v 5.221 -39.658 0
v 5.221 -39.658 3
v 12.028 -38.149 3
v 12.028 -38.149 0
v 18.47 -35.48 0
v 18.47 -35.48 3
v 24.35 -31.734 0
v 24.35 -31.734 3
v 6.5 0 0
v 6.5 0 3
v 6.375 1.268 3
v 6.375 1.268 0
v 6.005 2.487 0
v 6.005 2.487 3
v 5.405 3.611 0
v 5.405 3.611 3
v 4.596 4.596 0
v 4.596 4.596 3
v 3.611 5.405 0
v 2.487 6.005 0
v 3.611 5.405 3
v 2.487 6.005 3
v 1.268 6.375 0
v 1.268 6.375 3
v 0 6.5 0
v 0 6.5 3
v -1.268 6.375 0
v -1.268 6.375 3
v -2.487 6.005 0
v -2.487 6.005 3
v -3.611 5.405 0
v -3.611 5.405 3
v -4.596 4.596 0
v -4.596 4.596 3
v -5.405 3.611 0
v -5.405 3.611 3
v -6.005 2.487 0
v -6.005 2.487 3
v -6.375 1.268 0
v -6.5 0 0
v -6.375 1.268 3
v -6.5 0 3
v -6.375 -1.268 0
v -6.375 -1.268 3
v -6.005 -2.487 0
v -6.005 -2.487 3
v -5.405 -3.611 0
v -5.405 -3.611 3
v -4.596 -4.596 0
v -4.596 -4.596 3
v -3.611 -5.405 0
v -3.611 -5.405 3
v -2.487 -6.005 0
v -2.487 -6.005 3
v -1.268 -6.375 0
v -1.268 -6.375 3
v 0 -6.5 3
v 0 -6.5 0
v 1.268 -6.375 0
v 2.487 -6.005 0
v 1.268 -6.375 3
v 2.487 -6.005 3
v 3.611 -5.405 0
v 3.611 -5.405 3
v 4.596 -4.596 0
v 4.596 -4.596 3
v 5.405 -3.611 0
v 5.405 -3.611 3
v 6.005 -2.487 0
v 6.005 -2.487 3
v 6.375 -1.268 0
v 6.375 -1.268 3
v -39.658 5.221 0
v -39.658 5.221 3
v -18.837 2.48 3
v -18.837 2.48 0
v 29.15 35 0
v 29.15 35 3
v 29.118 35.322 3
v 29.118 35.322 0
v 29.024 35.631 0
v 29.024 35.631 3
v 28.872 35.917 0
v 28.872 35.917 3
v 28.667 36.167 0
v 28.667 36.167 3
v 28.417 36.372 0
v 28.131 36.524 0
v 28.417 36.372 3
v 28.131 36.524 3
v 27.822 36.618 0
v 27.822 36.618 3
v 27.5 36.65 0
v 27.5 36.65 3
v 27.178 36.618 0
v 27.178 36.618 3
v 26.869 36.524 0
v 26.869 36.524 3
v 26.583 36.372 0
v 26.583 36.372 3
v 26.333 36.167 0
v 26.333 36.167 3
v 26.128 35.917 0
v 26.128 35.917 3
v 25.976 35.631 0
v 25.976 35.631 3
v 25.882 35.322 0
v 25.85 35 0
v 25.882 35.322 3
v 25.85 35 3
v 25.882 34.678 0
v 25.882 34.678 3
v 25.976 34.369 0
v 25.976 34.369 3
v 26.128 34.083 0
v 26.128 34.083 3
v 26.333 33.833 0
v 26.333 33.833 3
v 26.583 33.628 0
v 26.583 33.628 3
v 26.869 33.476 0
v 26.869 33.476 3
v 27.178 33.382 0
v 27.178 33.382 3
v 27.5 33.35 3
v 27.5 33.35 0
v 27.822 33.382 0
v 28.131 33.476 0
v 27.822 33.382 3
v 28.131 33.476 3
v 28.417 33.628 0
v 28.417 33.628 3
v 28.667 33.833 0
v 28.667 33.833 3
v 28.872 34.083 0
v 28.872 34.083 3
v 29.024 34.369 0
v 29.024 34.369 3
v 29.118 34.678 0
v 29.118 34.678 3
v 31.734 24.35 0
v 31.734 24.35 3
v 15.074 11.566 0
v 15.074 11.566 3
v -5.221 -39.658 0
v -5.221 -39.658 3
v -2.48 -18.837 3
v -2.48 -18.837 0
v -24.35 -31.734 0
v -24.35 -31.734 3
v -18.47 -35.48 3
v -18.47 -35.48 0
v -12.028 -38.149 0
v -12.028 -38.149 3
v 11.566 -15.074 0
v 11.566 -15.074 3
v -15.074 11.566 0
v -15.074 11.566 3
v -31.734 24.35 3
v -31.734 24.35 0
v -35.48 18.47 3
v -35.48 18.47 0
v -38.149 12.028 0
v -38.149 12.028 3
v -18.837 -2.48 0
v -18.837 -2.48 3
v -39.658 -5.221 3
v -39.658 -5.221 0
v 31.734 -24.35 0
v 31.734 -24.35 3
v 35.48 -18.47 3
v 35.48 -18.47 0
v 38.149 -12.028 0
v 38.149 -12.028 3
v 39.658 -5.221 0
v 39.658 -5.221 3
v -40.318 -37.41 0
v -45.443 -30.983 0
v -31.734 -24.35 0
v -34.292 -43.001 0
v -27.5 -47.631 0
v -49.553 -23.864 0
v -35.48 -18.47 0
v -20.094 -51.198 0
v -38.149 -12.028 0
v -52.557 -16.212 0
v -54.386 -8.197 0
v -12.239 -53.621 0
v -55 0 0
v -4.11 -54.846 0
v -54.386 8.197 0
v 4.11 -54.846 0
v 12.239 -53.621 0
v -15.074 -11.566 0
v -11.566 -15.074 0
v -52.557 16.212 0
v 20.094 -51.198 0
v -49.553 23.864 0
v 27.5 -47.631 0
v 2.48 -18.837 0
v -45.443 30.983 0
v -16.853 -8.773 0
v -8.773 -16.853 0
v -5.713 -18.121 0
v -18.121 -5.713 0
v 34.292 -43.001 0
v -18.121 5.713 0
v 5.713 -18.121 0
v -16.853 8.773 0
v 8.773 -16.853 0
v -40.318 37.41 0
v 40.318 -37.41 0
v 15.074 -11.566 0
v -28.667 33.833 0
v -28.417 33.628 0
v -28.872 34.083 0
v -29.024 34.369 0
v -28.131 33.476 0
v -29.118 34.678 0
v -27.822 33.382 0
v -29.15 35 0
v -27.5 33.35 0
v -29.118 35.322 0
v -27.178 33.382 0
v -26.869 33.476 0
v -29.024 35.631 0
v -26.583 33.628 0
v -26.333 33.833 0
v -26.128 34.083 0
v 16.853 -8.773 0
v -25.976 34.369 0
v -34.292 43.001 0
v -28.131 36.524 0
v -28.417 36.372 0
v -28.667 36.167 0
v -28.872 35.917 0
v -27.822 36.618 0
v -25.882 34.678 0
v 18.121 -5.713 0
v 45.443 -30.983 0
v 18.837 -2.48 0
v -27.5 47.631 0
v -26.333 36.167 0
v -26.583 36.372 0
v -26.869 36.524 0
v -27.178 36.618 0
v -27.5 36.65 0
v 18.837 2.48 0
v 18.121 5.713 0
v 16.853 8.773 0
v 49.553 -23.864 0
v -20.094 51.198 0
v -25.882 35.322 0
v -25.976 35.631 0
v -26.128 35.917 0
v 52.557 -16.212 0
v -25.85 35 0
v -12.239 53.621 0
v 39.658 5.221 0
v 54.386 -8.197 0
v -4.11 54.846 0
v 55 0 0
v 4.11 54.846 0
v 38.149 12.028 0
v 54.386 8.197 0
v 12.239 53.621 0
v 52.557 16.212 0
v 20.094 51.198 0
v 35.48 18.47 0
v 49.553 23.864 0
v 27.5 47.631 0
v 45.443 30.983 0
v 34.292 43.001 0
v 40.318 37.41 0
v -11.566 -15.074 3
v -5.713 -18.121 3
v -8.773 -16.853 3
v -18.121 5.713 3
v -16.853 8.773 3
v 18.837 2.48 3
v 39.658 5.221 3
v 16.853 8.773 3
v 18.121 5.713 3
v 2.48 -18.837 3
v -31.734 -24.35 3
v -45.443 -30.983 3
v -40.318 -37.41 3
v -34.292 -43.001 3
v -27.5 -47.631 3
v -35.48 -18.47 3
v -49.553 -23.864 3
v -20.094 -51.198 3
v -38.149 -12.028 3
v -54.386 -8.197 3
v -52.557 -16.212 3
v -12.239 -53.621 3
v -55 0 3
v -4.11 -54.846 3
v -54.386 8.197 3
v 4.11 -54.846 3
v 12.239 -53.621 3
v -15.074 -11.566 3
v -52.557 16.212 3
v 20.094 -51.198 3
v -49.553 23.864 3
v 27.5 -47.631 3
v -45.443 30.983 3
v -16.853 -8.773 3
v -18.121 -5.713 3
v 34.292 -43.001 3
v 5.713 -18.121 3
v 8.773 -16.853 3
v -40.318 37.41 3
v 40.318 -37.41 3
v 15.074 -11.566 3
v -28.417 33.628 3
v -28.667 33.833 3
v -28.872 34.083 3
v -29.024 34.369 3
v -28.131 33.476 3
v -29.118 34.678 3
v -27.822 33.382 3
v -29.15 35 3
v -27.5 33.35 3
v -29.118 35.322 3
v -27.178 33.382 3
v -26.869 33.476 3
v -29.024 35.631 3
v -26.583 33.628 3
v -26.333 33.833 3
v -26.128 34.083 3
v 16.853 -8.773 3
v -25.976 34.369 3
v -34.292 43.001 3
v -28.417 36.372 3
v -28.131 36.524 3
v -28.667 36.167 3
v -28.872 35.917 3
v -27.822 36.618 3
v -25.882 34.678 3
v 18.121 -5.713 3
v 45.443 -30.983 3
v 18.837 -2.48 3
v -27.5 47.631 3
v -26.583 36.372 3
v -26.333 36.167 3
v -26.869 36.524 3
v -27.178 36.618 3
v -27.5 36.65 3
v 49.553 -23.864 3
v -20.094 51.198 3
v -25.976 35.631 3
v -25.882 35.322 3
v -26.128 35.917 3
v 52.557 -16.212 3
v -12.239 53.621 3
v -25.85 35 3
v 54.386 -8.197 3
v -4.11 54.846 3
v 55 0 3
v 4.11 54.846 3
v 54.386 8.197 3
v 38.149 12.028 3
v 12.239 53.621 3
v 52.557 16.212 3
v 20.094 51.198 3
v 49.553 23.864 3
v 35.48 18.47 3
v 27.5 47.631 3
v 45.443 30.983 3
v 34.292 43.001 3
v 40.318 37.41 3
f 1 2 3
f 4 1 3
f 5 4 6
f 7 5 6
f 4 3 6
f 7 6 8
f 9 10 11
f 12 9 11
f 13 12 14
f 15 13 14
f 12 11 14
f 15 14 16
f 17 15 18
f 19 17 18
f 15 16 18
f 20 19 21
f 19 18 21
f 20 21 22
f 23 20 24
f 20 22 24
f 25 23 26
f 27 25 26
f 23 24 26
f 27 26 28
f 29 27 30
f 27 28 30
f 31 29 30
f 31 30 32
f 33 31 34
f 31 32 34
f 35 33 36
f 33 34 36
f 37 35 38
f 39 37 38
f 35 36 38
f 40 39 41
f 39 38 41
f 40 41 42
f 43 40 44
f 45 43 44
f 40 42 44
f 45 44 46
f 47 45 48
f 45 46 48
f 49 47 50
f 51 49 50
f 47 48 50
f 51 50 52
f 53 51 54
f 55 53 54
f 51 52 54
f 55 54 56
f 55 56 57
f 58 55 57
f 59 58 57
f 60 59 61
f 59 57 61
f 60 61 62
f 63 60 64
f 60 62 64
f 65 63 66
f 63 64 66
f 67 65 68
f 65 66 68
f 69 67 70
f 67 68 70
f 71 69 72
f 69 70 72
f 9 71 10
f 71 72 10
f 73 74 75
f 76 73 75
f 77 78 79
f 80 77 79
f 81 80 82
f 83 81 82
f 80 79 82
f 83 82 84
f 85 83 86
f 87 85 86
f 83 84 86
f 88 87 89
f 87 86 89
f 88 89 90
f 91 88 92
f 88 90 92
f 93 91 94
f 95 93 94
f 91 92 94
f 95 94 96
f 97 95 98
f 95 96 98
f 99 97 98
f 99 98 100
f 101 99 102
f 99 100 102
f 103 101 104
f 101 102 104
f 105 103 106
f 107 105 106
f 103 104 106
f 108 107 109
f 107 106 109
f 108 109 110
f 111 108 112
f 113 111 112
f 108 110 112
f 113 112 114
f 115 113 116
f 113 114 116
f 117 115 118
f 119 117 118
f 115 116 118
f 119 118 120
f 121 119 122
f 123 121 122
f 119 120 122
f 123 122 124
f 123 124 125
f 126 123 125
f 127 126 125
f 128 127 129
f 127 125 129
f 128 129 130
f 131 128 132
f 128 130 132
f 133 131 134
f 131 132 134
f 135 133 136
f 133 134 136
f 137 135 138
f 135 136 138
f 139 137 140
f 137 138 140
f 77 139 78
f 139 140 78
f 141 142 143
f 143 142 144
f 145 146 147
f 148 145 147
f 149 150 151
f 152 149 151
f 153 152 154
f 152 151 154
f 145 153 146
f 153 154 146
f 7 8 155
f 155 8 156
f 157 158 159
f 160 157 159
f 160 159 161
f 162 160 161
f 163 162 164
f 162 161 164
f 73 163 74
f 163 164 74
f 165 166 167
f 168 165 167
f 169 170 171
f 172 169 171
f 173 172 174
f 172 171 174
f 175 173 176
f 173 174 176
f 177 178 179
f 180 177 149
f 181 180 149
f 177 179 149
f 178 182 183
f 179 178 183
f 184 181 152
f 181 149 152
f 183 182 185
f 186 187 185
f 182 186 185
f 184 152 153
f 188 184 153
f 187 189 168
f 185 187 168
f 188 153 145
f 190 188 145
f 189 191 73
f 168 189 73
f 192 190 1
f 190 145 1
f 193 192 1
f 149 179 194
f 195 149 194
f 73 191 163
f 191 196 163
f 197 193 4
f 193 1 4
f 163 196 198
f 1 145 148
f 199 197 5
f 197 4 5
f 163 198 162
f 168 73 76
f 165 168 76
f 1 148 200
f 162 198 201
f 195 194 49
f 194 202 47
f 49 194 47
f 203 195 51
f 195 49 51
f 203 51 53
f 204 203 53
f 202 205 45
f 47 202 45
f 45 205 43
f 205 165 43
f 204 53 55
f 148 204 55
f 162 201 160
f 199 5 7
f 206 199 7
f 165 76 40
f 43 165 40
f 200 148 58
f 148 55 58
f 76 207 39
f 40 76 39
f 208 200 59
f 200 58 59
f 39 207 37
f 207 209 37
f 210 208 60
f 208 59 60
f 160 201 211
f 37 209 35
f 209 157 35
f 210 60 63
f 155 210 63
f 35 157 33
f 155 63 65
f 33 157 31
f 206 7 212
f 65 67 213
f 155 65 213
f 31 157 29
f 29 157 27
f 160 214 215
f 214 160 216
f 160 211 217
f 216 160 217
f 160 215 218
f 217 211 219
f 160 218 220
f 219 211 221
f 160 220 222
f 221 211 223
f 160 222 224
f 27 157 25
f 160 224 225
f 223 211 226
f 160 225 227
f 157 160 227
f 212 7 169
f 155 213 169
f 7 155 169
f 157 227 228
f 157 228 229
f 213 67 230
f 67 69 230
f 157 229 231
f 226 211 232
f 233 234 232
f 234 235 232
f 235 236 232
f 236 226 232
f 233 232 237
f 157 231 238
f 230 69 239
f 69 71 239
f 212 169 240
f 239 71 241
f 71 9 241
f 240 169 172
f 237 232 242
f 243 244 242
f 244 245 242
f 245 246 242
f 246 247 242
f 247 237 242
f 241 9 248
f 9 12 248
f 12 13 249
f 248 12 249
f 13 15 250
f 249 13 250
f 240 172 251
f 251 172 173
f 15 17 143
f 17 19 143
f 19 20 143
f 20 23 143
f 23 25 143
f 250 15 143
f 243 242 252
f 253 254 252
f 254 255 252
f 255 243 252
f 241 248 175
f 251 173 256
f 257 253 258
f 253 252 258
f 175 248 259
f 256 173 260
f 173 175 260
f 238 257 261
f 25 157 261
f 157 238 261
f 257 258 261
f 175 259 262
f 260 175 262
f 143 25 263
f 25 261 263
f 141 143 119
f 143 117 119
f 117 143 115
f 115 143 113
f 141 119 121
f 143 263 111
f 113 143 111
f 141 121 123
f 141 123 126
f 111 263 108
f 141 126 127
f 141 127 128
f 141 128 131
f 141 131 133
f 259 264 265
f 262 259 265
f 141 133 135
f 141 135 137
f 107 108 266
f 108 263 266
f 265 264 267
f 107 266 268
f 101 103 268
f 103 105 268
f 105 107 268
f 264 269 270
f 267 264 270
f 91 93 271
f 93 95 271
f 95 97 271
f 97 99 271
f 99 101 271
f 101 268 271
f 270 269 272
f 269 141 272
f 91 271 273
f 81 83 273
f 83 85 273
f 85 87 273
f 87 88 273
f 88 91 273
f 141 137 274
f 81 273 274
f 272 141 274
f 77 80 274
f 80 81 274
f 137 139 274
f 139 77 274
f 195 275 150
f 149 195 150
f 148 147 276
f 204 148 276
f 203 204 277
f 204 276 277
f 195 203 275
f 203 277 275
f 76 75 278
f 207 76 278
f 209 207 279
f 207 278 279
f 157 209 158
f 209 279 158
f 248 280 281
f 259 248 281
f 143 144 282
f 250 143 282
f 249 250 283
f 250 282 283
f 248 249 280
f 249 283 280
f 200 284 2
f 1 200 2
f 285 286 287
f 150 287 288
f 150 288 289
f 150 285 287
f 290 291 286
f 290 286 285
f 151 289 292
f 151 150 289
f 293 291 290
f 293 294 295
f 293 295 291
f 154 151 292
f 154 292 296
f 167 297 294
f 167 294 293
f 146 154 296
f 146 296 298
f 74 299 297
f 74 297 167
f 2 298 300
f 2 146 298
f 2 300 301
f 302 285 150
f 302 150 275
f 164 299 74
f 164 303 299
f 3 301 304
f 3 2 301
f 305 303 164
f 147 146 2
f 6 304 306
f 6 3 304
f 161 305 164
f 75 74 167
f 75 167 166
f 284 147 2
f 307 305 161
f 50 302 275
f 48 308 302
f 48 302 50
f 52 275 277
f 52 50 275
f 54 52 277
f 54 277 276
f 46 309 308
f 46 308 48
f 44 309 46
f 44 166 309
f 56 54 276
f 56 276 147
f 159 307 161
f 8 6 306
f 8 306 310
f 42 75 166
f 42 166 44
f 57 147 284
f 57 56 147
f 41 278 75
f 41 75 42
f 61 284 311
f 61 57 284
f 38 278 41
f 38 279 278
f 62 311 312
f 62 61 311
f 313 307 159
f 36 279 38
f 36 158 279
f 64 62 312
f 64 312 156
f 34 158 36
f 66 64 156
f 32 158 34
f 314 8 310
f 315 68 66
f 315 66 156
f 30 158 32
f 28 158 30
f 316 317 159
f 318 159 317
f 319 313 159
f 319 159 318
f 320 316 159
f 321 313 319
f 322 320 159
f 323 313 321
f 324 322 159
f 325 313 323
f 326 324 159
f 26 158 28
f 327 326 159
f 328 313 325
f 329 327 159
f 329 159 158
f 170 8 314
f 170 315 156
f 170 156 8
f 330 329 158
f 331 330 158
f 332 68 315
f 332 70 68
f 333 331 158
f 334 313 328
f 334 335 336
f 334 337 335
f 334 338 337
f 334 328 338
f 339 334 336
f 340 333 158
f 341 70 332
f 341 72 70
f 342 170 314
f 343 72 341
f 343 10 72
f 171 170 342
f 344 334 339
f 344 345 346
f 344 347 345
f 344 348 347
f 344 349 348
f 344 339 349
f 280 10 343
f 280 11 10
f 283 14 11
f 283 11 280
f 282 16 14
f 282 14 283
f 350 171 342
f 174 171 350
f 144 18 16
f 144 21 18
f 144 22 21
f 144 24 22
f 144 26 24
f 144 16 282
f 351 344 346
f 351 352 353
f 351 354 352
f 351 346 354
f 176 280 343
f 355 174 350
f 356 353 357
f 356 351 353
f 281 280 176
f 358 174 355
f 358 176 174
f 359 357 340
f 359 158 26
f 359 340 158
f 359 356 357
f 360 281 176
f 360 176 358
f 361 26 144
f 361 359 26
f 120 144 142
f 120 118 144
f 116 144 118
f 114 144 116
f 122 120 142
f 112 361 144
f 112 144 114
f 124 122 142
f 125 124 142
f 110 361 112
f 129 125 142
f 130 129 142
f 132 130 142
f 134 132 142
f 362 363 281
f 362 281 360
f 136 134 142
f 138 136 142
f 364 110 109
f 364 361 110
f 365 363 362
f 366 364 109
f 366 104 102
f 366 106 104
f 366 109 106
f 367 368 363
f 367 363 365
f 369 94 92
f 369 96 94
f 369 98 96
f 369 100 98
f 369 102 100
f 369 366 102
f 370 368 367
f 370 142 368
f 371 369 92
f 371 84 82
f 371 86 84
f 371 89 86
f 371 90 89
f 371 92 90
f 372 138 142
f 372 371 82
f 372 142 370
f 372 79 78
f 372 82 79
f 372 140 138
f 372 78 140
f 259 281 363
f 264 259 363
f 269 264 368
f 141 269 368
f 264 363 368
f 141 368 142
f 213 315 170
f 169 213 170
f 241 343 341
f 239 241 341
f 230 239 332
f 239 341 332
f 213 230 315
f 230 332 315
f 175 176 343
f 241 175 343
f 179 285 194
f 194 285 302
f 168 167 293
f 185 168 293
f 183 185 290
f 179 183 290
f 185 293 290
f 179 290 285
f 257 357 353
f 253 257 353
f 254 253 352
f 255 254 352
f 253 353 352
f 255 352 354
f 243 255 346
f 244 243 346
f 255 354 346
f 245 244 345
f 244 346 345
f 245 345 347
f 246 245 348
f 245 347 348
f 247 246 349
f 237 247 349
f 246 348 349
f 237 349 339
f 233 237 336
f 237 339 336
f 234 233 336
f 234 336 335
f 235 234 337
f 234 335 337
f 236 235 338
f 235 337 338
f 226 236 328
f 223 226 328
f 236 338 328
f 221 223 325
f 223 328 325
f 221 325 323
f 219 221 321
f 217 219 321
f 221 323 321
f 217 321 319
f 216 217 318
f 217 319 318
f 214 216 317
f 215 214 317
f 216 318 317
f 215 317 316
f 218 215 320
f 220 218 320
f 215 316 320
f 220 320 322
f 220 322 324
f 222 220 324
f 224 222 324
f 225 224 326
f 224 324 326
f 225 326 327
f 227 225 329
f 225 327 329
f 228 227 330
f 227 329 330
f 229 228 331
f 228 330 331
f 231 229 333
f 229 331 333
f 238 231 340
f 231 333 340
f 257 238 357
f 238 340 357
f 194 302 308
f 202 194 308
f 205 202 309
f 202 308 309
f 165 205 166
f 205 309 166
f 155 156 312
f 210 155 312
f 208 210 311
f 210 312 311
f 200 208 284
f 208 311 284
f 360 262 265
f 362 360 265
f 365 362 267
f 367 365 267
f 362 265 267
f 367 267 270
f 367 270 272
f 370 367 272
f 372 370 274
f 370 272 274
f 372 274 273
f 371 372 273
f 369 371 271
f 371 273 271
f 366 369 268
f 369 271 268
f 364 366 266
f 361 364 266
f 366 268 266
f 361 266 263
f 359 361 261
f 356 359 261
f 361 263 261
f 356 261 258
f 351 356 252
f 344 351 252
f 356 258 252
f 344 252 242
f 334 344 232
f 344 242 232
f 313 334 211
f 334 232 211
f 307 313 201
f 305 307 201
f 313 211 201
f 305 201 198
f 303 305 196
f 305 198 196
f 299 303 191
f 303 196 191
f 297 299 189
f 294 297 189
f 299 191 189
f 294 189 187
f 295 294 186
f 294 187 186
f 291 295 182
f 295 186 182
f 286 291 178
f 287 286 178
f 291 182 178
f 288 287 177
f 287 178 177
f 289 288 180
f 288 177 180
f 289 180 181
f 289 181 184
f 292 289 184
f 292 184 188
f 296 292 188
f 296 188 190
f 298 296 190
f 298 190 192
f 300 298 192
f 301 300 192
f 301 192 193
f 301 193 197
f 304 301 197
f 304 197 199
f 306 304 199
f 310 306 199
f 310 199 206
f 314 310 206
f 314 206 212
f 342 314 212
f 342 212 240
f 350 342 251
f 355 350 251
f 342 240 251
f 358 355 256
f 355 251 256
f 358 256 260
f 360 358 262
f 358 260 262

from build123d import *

# Parameters (mm, degrees)
SKETCH_1_R          = 55
EXTRUDE_1_DEPTH     = 3
SKETCH_3_R          = 1.65
CUT_EXTRUDE_1_DEPTH = 3
CUT_EXTRUDE_2_DEPTH = 3
SKETCH_5_R          = 6.5
CUT_EXTRUDE_3_DEPTH = 3


with BuildPart() as part:
    # 草图1 → 凸台-拉伸1 (new body)
    with BuildSketch(Plane.XY):
        Circle(SKETCH_1_R)
    extrude(amount=EXTRUDE_1_DEPTH)

    # 草图3 → 切除-拉伸1 (cut)
    with BuildSketch(Plane.XY.offset(3)):
        with Locations((27.5, 35)):
            Circle(SKETCH_3_R)
        with Locations((-27.5, 35)):
            Circle(SKETCH_3_R)
    extrude(amount=-CUT_EXTRUDE_1_DEPTH, mode=Mode.SUBTRACT)

    # 草图4 → 切除-拉伸2 (cut)
    with BuildSketch(Plane.XY.offset(3)):
        with BuildLine():
            ThreePointArc((15.073713466, 11.566467151), (17.553711118, 7.270985215), (18.837452366, 2.479997652))
            Line((18.837452366, 2.479997652), (39.657794455, 5.221047689))
            ThreePointArc((39.657794455, 5.221047689), (36.9551813, 15.307337295), (31.734133612, 24.35045716))
            Line((31.734133612, 24.35045716), (15.073713466, 11.566467151))
        make_face()
        with BuildLine():
            Line((-39.657794455, 5.221047689), (-18.837452366, 2.479997652))
            ThreePointArc((-18.837452366, 2.479997652), (-17.553711118, 7.270985215), (-15.073713466, 11.566467151))
            Line((-15.073713466, 11.566467151), (-31.734133612, 24.35045716))
            ThreePointArc((-31.734133612, 24.35045716), (-36.9551813, 15.307337295), (-39.657794455, 5.221047689))
        make_face()
        with BuildLine():
            Line((-31.734133612, -24.35045716), (-15.073713466, -11.566467151))
            ThreePointArc((-15.073713466, -11.566467151), (-17.553711118, -7.270985215), (-18.837452366, -2.479997652))
            Line((-18.837452366, -2.479997652), (-39.657794455, -5.221047689))
            ThreePointArc((-39.657794455, -5.221047689), (-36.9551813, -15.307337295), (-31.734133612, -24.35045716))
        make_face()
        with BuildLine():
            Line((-5.221047689, -39.657794455), (-2.479997652, -18.837452366))
            ThreePointArc((-2.479997652, -18.837452366), (-7.270985215, -17.553711118), (-11.566467151, -15.073713466))
            Line((-11.566467151, -15.073713466), (-24.35045716, -31.734133612))
            ThreePointArc((-24.35045716, -31.734133612), (-15.307337295, -36.9551813), (-5.221047689, -39.657794455))
        make_face()
        with BuildLine():
            Line((24.35045716, -31.734133612), (11.566467151, -15.073713466))
            ThreePointArc((11.566467151, -15.073713466), (7.270985215, -17.553711118), (2.479997652, -18.837452366))
            Line((2.479997652, -18.837452366), (5.221047689, -39.657794455))
            ThreePointArc((5.221047689, -39.657794455), (15.307337295, -36.9551813), (24.35045716, -31.734133612))
        make_face()
        with BuildLine():
            Line((39.657794455, -5.221047689), (18.837452366, -2.479997652))
            ThreePointArc((18.837452366, -2.479997652), (17.553711118, -7.270985215), (15.073713466, -11.566467151))
            Line((15.073713466, -11.566467151), (31.734133612, -24.35045716))
            ThreePointArc((31.734133612, -24.35045716), (36.9551813, -15.307337295), (39.657794455, -5.221047689))
        make_face()
    extrude(amount=-CUT_EXTRUDE_2_DEPTH, mode=Mode.SUBTRACT)

    # 草图5 → 切除-拉伸3 (cut)
    with BuildSketch(Plane.XY.offset(3)):
        Circle(SKETCH_5_R)
    extrude(amount=-CUT_EXTRUDE_3_DEPTH, mode=Mode.SUBTRACT)


solid = part.part
